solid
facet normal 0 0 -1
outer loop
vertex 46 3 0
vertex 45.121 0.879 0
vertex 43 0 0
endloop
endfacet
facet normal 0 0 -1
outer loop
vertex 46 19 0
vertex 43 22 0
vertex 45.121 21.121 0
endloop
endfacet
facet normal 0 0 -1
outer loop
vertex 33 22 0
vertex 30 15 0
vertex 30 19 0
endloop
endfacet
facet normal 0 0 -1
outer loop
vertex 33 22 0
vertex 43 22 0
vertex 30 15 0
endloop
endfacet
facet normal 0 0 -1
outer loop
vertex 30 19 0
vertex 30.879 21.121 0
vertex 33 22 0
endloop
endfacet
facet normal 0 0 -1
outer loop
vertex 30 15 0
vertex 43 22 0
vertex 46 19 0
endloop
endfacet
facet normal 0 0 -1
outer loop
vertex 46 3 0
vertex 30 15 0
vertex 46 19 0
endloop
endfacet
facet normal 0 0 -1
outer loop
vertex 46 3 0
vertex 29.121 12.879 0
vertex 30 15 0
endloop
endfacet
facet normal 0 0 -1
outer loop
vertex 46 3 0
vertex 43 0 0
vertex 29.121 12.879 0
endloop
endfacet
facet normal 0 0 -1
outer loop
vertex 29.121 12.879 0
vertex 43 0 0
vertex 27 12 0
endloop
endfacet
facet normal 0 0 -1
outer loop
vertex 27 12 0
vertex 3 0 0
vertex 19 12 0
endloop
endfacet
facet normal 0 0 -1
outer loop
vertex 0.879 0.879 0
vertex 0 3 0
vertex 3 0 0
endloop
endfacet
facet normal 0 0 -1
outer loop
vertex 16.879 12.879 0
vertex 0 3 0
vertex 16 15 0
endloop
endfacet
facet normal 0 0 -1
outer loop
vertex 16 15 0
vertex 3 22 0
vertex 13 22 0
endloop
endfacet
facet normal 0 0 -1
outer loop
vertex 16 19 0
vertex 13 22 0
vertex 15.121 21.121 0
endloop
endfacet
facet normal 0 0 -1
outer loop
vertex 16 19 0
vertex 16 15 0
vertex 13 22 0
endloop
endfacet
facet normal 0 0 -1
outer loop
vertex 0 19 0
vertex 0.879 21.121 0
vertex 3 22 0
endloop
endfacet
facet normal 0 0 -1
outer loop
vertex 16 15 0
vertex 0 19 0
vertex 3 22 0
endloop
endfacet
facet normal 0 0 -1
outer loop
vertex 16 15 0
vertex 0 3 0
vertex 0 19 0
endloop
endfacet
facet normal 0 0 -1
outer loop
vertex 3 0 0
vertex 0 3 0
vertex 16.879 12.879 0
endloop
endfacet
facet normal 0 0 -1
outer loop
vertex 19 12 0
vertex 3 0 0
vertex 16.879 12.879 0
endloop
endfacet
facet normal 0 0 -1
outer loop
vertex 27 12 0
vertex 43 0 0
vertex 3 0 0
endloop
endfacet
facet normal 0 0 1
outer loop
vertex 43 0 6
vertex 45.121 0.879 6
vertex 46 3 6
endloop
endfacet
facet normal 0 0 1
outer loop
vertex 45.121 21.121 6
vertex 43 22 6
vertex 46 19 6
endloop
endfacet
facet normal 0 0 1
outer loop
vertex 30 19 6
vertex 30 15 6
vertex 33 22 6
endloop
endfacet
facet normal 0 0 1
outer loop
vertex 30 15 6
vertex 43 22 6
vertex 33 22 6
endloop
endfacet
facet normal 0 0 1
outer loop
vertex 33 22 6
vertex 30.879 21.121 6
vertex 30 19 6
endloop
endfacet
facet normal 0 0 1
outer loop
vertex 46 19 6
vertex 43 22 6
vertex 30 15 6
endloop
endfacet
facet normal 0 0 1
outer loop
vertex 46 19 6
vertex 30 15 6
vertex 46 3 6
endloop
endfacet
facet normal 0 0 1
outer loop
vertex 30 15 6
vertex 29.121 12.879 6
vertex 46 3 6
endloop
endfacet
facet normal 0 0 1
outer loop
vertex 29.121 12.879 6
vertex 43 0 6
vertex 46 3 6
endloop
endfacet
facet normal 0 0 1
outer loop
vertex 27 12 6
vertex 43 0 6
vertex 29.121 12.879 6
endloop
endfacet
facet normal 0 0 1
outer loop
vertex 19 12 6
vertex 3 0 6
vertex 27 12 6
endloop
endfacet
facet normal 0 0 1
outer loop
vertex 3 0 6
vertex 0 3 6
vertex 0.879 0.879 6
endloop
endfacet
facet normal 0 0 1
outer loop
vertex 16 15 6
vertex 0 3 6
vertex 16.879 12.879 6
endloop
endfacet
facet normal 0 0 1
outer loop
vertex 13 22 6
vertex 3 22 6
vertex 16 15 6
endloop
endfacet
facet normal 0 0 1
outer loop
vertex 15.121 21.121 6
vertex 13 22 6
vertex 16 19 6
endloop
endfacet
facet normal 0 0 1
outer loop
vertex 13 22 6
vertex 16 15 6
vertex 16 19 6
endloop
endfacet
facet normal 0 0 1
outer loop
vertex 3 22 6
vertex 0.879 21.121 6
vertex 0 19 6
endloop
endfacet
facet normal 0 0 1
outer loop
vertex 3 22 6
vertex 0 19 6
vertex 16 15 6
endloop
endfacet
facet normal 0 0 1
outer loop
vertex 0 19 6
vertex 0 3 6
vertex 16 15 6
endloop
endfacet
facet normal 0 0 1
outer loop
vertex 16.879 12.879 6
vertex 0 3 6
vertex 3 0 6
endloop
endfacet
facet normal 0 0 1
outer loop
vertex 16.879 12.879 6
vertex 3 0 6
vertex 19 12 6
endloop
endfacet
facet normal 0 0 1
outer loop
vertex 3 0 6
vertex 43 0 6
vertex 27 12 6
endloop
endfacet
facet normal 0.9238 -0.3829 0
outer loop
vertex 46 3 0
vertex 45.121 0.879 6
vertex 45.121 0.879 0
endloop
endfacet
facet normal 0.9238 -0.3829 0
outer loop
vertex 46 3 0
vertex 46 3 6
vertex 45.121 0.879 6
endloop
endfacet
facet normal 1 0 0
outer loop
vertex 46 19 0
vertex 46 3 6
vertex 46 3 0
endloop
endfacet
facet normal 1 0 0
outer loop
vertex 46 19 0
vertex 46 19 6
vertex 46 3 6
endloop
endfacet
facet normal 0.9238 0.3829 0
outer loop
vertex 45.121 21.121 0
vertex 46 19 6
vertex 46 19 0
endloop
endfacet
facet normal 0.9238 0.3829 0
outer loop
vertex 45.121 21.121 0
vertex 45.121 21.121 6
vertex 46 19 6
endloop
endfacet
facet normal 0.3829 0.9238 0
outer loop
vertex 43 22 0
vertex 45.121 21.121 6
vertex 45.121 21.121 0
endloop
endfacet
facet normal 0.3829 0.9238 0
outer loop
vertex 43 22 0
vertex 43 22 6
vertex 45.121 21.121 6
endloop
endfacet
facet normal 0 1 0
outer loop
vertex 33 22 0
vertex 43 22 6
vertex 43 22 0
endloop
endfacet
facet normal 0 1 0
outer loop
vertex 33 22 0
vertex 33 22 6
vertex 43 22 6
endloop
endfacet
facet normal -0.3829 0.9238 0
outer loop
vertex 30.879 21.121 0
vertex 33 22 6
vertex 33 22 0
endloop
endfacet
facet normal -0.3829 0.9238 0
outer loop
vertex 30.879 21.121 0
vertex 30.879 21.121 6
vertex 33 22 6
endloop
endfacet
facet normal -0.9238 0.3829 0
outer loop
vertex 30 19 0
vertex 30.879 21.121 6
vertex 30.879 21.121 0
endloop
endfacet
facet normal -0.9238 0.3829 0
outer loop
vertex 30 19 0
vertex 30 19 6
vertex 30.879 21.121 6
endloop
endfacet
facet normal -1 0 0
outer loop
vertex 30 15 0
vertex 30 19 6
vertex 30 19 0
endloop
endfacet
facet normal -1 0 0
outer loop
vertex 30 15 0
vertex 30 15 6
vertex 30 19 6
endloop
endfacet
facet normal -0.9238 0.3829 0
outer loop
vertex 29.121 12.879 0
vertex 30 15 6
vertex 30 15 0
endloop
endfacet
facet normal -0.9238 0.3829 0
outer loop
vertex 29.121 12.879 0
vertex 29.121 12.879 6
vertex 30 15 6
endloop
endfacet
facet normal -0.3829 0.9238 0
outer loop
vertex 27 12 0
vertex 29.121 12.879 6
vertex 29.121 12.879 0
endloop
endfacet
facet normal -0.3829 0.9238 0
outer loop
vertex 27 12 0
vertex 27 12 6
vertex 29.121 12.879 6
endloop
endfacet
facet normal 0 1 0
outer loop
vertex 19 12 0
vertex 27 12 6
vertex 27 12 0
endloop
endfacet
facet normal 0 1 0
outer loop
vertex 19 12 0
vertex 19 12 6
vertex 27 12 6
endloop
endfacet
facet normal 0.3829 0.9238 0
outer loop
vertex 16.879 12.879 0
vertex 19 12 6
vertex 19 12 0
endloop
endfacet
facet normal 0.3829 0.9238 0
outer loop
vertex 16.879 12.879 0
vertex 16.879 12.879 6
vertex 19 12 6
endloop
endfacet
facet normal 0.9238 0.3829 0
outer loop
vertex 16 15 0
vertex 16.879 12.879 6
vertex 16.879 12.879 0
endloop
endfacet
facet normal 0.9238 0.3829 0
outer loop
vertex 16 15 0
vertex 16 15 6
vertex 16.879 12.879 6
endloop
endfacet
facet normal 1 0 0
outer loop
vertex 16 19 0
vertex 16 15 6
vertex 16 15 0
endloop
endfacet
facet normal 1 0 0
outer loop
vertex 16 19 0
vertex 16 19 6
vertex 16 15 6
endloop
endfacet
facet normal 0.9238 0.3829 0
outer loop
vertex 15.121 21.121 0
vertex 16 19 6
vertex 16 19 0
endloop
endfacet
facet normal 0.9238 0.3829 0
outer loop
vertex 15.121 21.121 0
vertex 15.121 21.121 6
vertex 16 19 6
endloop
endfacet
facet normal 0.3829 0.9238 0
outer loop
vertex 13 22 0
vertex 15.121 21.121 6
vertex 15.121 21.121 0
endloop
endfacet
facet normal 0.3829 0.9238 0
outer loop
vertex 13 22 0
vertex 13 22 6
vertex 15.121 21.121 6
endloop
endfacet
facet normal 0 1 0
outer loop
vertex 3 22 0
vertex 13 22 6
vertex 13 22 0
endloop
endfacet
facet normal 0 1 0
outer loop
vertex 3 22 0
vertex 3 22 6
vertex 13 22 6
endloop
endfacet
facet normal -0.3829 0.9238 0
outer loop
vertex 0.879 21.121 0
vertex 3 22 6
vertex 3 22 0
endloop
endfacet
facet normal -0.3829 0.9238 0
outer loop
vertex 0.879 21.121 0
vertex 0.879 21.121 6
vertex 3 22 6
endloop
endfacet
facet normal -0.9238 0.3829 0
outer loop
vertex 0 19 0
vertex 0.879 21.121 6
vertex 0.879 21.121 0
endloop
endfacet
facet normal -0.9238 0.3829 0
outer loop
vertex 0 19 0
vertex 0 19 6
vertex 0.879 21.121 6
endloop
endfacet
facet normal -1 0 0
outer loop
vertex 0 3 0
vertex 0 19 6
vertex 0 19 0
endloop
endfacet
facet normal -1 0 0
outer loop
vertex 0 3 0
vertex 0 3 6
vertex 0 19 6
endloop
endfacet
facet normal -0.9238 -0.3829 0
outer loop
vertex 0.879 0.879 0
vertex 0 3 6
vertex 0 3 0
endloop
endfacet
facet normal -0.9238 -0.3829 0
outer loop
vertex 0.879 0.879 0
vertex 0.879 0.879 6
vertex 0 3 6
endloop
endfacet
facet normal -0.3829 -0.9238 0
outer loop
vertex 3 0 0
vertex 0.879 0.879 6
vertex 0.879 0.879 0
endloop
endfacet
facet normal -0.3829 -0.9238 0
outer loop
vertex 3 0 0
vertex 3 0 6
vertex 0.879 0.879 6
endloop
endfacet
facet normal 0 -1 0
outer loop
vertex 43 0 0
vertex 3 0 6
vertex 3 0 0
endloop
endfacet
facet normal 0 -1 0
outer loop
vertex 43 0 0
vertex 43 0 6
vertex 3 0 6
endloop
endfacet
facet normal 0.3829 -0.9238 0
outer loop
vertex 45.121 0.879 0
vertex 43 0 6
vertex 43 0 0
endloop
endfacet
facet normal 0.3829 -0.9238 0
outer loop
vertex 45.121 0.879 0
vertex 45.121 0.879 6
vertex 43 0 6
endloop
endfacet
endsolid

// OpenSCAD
$fn = 32;

// ----------------------------------------------------------------------
// Eye lug: clevis, 6 mm thick
// ----------------------------------------------------------------------

// --- parameters (mm) ---
profile_height = 6;       // extrusion height
profile_points = 24;      // points of the closed outline

profile = [[0, 3], [0.879, 0.879], [3, 0], [43, 0], [45.121, 0.879], [46, 3], [46, 19], [45.121, 21.121], [43, 22], [33, 22], [30.879, 21.121], [30, 19], [30, 15], [29.121, 12.879], [27, 12], [19, 12], [16.879, 12.879], [16, 15], [16, 19], [15.121, 21.121], [13, 22], [3, 22], [0.879, 21.121], [0, 19]];  // single closed polygon, 24 points, counter clockwise

// --- the one profile operation ---
linear_extrude(height = profile_height) polygon(points = profile);
